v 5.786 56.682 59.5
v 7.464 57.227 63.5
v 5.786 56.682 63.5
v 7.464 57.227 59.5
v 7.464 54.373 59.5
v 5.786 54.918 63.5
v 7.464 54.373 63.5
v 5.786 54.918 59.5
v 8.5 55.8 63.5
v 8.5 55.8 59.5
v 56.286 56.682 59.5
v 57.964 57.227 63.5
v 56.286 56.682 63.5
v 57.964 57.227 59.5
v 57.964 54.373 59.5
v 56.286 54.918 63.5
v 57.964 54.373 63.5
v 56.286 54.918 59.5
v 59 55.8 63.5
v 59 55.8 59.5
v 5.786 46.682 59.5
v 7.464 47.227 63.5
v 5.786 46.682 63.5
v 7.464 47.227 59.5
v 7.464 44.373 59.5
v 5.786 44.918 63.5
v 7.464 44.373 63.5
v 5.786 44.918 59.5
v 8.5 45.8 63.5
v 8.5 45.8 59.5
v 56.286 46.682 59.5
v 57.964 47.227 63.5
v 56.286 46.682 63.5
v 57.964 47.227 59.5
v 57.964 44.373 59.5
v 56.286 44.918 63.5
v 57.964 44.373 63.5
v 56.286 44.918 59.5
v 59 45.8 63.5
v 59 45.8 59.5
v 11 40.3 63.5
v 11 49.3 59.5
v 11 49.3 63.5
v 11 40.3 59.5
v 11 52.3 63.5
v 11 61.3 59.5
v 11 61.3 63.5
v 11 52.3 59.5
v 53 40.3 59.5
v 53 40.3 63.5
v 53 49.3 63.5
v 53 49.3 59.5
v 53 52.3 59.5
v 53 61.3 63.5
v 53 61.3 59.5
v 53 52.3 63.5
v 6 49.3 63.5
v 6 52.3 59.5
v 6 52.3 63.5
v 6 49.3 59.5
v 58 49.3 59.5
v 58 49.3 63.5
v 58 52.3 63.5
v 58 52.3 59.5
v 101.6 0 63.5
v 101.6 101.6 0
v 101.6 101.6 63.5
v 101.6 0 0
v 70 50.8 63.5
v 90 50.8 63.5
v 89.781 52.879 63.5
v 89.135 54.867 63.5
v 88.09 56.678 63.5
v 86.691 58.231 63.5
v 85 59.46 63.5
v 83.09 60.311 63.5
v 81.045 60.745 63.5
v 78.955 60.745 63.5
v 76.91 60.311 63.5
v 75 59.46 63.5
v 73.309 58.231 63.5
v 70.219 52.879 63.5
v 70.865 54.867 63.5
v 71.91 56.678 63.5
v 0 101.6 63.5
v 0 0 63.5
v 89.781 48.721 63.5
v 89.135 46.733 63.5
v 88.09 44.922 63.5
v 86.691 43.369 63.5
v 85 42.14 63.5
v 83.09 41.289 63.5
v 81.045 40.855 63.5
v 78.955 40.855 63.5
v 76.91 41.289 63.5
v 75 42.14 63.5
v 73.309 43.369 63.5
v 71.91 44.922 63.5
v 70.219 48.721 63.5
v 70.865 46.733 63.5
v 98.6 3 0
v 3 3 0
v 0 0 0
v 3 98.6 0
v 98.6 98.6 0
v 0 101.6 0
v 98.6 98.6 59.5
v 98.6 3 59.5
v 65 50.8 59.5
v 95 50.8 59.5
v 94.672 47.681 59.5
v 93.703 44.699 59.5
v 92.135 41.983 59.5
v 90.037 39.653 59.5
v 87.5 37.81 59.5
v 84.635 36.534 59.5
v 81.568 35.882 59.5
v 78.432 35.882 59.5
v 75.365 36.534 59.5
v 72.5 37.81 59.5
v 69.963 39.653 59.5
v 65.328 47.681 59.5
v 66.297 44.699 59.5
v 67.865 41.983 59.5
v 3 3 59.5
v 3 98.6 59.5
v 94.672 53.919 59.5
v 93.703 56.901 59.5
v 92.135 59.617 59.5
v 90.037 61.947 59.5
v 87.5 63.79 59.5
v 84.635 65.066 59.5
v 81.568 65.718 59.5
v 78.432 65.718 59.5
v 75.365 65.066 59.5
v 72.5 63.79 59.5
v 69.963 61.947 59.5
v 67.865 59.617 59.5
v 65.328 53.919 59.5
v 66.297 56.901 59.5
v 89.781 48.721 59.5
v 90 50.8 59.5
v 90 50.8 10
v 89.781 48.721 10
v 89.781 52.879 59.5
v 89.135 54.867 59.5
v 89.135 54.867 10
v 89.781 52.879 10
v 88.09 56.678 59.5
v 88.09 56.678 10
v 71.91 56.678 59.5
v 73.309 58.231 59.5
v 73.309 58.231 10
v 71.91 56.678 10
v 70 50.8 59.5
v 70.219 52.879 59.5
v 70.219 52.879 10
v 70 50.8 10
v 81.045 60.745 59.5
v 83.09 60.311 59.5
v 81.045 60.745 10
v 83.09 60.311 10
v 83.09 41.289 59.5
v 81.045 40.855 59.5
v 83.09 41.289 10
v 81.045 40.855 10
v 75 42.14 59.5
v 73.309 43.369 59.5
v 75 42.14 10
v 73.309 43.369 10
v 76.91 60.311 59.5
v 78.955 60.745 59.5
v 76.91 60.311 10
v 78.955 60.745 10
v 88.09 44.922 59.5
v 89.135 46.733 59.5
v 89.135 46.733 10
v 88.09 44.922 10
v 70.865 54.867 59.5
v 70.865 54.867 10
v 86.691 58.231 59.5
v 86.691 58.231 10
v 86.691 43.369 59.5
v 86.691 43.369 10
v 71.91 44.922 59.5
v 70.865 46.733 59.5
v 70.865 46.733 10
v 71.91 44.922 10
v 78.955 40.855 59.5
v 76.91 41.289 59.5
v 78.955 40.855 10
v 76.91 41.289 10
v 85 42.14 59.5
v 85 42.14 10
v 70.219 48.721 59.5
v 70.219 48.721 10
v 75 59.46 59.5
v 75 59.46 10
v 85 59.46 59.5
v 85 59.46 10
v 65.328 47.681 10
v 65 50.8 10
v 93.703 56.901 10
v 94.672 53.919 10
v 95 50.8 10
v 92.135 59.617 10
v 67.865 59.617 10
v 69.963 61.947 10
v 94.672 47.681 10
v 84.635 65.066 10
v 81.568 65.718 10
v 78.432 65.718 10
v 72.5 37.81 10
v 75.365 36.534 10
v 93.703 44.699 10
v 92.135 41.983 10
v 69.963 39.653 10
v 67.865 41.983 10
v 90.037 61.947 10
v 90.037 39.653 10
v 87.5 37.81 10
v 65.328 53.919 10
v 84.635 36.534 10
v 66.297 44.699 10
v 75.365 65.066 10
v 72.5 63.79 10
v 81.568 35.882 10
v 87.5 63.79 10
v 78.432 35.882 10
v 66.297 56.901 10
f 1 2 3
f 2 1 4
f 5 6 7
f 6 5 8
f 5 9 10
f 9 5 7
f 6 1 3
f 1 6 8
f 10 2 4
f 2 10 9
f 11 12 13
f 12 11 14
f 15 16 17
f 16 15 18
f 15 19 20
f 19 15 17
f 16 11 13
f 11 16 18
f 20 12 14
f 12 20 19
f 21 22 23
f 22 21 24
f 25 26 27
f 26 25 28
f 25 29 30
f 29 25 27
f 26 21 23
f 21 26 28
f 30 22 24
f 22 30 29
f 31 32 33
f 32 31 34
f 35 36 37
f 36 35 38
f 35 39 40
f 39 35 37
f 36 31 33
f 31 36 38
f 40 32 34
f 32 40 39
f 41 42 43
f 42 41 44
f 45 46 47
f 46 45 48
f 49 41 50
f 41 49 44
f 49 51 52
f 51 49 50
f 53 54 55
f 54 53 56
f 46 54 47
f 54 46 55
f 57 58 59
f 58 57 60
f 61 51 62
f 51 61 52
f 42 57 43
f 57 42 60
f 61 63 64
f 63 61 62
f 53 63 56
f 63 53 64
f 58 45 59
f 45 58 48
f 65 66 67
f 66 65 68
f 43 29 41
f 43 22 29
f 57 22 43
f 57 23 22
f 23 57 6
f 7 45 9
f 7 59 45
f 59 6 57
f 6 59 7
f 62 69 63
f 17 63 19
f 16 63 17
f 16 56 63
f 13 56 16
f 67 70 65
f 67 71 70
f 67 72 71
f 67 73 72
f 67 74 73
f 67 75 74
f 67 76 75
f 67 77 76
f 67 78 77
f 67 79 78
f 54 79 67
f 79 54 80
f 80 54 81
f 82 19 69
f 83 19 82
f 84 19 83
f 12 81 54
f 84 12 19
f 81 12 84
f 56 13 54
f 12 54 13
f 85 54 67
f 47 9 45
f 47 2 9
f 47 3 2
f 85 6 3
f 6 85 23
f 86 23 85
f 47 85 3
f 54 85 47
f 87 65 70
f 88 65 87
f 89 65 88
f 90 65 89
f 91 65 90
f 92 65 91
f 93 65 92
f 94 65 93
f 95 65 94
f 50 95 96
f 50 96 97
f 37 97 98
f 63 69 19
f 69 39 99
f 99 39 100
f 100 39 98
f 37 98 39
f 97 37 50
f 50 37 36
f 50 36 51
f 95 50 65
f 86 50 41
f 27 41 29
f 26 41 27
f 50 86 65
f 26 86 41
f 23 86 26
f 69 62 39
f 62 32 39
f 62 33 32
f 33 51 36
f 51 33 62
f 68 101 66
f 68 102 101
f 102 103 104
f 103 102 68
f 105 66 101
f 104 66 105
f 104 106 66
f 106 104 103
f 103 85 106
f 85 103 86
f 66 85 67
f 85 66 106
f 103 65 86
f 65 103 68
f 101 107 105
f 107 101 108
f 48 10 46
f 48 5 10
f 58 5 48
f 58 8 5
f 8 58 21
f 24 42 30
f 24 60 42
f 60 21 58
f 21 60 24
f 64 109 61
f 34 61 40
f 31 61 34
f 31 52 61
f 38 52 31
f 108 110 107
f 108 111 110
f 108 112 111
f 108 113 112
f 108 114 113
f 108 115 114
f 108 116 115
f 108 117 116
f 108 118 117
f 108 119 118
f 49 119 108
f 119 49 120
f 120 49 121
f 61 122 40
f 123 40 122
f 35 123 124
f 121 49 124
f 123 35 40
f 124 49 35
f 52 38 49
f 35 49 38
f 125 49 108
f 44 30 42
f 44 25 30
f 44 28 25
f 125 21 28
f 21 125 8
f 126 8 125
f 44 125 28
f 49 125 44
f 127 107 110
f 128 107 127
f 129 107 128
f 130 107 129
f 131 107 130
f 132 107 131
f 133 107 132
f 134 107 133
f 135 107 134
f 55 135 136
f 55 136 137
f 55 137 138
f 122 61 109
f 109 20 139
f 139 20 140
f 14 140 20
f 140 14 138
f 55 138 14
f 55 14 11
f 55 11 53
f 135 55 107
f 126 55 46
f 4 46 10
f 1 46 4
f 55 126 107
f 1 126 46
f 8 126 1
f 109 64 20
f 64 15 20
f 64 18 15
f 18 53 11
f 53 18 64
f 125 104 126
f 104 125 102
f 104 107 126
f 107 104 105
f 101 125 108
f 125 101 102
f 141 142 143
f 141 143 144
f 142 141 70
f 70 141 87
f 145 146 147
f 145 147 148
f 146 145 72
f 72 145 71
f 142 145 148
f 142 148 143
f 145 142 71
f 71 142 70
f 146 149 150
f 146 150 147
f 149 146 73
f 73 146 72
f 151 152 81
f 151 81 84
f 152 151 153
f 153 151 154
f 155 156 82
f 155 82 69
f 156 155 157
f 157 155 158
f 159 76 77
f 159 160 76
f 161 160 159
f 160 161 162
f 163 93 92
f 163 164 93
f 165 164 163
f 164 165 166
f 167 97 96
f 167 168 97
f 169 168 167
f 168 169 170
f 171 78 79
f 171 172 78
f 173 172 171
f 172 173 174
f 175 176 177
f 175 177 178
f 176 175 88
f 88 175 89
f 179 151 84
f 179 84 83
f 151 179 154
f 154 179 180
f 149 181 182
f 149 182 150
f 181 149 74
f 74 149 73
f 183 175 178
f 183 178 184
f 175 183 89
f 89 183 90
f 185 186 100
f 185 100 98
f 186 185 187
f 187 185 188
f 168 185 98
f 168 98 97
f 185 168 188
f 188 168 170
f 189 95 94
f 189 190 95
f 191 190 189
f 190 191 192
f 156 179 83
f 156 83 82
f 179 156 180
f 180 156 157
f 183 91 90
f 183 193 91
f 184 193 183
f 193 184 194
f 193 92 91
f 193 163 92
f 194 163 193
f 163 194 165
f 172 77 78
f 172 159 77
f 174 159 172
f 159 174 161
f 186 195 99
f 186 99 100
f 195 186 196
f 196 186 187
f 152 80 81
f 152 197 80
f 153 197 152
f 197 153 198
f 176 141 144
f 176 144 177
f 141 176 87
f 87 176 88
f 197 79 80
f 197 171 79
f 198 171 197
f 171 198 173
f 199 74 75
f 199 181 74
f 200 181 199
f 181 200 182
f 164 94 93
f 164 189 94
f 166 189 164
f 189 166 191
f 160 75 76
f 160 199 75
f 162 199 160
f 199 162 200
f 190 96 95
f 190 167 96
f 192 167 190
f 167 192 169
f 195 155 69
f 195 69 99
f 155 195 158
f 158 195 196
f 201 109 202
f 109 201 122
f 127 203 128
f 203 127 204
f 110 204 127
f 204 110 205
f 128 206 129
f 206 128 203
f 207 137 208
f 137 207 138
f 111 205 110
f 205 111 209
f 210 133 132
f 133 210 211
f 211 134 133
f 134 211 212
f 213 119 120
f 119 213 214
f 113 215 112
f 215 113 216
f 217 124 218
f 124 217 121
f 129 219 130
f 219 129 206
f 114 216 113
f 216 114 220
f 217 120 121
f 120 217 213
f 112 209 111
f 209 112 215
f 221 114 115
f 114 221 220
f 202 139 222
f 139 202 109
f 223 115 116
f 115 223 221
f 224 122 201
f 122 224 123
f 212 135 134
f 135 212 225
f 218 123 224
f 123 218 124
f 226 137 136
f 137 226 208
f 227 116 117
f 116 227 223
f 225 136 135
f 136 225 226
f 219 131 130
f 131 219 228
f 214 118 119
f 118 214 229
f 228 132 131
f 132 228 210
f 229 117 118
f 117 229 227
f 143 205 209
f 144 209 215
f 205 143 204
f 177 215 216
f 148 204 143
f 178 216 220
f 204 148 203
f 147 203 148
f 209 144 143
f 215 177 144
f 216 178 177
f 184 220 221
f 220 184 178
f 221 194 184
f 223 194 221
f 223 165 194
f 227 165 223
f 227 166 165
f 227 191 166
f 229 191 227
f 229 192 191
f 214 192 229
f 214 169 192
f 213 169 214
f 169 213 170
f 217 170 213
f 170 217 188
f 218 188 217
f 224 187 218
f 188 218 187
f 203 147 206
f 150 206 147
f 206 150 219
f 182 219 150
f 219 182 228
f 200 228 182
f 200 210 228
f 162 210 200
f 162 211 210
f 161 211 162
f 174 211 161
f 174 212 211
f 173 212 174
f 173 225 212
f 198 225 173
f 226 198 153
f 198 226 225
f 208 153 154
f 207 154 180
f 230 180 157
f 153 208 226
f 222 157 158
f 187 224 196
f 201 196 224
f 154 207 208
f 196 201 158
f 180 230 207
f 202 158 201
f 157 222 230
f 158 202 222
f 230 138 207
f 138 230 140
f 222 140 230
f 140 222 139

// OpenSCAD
iwidth = 4;
ilength= 4;
iheight=2.5;

mmwidth=iwidth*25.4;
mmlength=ilength*25.4;
mmheight=iheight*25.4;

rudderdia=15;
ruddershaft=10;

wall=3;







difference(){
    box();
    translate([wall, wall, -1]){
        cube([mmwidth-2*wall,mmlength-2*wall,mmheight-wall]);
    }
    
    translate([32,mmlength/2,150]){
        rotate([90,0,0]){
            servo();
        }
    }
    
    translate([80,mmlength/2, 5]){
        cylinder(120,ruddershaft,ruddershaft);
    } 
}
rudderholder();

module rudderholder(){
    difference(){
        translate([80,mmlength/2, 10]){
            cylinder(50,rudderdia,rudderdia);
        } 
        translate([80,mmlength/2, 5]){
            cylinder(70,ruddershaft,ruddershaft);
        }   
    }
}

module box(){
    cube([mmwidth,mmlength,mmheight]);

}

module servo(){ 
 //40.5x20
 color("yellow")
     
     rotate([90,0,0]){
        linear_extrude(height=120)
            square([42,21], center=true);
        linear_extrude(height=120)
            square([52,3], center=true);
         
         //10x50.5
         translate([25.5,5,60]){
            cylinder(h=120, r=1.5, center=true);
            translate([-50.5,0,0]){
                cylinder(h=120, r=1.5, center=true);
                translate([0,-10,0]){
                    cylinder(h=120, r=1.5, center=true);
                    translate([50.5,0,0])
                        cylinder(h=120, r=1.5, center=true);
                }
             }
         }
    }
}
